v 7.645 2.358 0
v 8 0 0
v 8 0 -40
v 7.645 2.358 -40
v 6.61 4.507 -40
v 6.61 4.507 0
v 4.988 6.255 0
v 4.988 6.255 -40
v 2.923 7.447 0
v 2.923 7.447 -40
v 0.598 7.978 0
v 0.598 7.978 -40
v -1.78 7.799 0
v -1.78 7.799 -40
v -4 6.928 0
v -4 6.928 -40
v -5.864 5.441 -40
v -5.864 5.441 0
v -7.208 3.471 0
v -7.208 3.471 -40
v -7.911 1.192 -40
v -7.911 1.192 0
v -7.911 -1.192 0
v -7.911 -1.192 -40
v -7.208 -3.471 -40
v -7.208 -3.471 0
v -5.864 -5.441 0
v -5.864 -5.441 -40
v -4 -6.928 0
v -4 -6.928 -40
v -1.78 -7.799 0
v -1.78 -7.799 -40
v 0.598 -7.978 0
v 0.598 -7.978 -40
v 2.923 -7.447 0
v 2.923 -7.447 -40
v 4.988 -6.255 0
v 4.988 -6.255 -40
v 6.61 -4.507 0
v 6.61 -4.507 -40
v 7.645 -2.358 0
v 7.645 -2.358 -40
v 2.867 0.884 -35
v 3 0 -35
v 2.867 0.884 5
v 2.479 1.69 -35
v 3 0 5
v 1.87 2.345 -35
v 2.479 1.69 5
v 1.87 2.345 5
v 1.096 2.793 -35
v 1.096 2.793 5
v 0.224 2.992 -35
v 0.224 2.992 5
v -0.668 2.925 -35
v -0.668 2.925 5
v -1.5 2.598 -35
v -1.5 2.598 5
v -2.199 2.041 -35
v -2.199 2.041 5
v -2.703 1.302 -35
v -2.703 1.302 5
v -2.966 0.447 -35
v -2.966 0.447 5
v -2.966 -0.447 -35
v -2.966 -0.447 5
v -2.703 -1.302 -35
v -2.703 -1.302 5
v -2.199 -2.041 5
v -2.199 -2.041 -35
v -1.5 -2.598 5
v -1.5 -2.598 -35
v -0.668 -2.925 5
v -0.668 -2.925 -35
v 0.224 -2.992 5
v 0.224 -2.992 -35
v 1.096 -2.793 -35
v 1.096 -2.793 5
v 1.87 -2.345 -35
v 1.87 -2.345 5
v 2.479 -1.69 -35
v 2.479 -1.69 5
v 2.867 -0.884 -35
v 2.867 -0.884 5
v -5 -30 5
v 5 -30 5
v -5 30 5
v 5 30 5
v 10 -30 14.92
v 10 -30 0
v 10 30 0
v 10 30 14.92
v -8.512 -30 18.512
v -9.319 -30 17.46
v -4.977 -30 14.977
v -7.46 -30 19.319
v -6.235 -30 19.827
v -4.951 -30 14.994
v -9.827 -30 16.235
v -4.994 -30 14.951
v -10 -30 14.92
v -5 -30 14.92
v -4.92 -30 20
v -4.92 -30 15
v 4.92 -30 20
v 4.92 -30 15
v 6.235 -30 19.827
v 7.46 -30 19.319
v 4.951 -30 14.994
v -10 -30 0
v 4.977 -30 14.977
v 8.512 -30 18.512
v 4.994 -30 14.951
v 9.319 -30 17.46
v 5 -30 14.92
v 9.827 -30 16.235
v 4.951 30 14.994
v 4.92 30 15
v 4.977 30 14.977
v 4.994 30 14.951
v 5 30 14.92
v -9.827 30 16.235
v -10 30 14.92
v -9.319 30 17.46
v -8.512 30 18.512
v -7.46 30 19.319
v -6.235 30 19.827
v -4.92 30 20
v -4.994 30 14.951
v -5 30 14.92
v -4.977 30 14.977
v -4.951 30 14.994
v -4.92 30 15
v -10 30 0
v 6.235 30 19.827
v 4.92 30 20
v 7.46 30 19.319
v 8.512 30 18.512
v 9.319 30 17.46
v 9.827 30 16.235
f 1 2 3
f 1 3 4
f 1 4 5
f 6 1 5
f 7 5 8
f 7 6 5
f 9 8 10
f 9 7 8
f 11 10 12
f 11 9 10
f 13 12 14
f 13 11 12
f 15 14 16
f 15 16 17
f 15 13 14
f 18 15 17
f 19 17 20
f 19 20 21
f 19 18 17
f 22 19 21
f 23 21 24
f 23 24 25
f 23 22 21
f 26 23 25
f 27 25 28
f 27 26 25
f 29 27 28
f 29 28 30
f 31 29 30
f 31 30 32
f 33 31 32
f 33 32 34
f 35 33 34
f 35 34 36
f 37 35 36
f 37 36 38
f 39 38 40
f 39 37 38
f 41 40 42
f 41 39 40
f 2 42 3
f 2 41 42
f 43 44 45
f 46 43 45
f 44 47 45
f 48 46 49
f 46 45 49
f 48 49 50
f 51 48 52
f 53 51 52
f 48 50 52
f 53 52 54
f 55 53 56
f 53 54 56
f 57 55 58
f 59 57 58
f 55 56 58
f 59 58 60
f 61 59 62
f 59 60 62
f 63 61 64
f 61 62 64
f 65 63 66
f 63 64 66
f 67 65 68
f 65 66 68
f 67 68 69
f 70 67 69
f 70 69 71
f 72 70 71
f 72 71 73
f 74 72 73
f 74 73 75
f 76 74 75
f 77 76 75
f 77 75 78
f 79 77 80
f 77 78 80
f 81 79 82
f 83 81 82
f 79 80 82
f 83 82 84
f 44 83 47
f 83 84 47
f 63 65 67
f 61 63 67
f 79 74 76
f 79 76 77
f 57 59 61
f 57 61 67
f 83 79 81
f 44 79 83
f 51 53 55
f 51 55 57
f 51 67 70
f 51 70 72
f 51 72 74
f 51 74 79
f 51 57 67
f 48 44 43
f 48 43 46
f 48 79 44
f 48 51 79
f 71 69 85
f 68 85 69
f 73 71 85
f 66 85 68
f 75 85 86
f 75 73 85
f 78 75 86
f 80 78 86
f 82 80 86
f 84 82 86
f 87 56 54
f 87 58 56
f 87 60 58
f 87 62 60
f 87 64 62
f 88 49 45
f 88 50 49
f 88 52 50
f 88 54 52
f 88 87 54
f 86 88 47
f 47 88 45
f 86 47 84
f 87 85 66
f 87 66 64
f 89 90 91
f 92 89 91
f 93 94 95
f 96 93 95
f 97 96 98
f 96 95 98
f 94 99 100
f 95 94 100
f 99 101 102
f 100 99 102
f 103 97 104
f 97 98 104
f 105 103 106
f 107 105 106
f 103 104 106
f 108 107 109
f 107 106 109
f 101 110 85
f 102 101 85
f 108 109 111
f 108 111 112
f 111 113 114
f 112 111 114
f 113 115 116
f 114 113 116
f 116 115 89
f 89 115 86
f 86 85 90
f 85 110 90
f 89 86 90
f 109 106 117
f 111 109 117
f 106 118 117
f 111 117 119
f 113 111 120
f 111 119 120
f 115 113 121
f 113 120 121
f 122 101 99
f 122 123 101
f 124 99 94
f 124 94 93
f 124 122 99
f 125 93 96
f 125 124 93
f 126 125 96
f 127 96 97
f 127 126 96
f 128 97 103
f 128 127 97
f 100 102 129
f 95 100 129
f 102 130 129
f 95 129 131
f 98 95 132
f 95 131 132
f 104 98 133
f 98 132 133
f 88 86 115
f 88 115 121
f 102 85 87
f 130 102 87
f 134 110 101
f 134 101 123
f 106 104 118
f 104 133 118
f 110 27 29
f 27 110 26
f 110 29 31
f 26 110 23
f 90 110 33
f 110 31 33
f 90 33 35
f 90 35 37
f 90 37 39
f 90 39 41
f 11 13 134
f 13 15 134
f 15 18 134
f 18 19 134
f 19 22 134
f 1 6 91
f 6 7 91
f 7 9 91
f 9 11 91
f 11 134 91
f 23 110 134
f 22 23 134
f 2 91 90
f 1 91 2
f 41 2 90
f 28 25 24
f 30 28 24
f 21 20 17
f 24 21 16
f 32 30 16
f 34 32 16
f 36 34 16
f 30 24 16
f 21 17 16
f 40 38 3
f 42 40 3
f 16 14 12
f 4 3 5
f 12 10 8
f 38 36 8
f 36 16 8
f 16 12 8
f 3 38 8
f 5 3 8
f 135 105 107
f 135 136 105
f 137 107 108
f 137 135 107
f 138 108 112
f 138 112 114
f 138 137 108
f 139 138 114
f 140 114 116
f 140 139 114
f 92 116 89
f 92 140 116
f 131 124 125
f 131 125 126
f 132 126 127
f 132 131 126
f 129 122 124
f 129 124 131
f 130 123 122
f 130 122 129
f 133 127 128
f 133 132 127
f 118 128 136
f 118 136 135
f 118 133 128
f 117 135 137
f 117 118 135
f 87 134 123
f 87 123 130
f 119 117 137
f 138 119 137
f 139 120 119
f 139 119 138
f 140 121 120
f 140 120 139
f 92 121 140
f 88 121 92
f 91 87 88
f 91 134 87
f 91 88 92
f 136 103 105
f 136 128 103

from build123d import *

# Parameters (mm, degrees)
F0_R     = 8
F1_DEPTH = 40
F2_W     = 20
F2_H     = 60
F3_DEPTH = 20
F4_R     = 5.08
F6_T     = -5


with BuildPart() as f1:
    # F0 (on Top) → F1 (new body)
    with BuildSketch(Plane.XY):
        Circle(F0_R)
    extrude(amount=-F1_DEPTH)

    # F2 (on Top) + F0 (on Top) → F3 (join)
    with BuildSketch(Plane.XY):
        Rectangle(F2_W, F2_H)
    with BuildSketch(Plane.XY):
        Circle(F0_R)
    extrude(amount=F3_DEPTH)

    # F4
    f4_edges = [f1.edges().sort_by_distance(p)[0] for p in [
        (-10, 0, 20),
        (10, 0, 20),
    ]]
    fillet(f4_edges, radius=F4_R)

    # F6
    f6_openings = [f1.faces().sort_by_distance(p)[0] for p in [
        (0, -30, 9.747524),
        (0, 30, 9.747524),
    ]]
    offset(amount=F6_T, openings=f6_openings, kind=Kind.INTERSECTION)


solid = f1.part
